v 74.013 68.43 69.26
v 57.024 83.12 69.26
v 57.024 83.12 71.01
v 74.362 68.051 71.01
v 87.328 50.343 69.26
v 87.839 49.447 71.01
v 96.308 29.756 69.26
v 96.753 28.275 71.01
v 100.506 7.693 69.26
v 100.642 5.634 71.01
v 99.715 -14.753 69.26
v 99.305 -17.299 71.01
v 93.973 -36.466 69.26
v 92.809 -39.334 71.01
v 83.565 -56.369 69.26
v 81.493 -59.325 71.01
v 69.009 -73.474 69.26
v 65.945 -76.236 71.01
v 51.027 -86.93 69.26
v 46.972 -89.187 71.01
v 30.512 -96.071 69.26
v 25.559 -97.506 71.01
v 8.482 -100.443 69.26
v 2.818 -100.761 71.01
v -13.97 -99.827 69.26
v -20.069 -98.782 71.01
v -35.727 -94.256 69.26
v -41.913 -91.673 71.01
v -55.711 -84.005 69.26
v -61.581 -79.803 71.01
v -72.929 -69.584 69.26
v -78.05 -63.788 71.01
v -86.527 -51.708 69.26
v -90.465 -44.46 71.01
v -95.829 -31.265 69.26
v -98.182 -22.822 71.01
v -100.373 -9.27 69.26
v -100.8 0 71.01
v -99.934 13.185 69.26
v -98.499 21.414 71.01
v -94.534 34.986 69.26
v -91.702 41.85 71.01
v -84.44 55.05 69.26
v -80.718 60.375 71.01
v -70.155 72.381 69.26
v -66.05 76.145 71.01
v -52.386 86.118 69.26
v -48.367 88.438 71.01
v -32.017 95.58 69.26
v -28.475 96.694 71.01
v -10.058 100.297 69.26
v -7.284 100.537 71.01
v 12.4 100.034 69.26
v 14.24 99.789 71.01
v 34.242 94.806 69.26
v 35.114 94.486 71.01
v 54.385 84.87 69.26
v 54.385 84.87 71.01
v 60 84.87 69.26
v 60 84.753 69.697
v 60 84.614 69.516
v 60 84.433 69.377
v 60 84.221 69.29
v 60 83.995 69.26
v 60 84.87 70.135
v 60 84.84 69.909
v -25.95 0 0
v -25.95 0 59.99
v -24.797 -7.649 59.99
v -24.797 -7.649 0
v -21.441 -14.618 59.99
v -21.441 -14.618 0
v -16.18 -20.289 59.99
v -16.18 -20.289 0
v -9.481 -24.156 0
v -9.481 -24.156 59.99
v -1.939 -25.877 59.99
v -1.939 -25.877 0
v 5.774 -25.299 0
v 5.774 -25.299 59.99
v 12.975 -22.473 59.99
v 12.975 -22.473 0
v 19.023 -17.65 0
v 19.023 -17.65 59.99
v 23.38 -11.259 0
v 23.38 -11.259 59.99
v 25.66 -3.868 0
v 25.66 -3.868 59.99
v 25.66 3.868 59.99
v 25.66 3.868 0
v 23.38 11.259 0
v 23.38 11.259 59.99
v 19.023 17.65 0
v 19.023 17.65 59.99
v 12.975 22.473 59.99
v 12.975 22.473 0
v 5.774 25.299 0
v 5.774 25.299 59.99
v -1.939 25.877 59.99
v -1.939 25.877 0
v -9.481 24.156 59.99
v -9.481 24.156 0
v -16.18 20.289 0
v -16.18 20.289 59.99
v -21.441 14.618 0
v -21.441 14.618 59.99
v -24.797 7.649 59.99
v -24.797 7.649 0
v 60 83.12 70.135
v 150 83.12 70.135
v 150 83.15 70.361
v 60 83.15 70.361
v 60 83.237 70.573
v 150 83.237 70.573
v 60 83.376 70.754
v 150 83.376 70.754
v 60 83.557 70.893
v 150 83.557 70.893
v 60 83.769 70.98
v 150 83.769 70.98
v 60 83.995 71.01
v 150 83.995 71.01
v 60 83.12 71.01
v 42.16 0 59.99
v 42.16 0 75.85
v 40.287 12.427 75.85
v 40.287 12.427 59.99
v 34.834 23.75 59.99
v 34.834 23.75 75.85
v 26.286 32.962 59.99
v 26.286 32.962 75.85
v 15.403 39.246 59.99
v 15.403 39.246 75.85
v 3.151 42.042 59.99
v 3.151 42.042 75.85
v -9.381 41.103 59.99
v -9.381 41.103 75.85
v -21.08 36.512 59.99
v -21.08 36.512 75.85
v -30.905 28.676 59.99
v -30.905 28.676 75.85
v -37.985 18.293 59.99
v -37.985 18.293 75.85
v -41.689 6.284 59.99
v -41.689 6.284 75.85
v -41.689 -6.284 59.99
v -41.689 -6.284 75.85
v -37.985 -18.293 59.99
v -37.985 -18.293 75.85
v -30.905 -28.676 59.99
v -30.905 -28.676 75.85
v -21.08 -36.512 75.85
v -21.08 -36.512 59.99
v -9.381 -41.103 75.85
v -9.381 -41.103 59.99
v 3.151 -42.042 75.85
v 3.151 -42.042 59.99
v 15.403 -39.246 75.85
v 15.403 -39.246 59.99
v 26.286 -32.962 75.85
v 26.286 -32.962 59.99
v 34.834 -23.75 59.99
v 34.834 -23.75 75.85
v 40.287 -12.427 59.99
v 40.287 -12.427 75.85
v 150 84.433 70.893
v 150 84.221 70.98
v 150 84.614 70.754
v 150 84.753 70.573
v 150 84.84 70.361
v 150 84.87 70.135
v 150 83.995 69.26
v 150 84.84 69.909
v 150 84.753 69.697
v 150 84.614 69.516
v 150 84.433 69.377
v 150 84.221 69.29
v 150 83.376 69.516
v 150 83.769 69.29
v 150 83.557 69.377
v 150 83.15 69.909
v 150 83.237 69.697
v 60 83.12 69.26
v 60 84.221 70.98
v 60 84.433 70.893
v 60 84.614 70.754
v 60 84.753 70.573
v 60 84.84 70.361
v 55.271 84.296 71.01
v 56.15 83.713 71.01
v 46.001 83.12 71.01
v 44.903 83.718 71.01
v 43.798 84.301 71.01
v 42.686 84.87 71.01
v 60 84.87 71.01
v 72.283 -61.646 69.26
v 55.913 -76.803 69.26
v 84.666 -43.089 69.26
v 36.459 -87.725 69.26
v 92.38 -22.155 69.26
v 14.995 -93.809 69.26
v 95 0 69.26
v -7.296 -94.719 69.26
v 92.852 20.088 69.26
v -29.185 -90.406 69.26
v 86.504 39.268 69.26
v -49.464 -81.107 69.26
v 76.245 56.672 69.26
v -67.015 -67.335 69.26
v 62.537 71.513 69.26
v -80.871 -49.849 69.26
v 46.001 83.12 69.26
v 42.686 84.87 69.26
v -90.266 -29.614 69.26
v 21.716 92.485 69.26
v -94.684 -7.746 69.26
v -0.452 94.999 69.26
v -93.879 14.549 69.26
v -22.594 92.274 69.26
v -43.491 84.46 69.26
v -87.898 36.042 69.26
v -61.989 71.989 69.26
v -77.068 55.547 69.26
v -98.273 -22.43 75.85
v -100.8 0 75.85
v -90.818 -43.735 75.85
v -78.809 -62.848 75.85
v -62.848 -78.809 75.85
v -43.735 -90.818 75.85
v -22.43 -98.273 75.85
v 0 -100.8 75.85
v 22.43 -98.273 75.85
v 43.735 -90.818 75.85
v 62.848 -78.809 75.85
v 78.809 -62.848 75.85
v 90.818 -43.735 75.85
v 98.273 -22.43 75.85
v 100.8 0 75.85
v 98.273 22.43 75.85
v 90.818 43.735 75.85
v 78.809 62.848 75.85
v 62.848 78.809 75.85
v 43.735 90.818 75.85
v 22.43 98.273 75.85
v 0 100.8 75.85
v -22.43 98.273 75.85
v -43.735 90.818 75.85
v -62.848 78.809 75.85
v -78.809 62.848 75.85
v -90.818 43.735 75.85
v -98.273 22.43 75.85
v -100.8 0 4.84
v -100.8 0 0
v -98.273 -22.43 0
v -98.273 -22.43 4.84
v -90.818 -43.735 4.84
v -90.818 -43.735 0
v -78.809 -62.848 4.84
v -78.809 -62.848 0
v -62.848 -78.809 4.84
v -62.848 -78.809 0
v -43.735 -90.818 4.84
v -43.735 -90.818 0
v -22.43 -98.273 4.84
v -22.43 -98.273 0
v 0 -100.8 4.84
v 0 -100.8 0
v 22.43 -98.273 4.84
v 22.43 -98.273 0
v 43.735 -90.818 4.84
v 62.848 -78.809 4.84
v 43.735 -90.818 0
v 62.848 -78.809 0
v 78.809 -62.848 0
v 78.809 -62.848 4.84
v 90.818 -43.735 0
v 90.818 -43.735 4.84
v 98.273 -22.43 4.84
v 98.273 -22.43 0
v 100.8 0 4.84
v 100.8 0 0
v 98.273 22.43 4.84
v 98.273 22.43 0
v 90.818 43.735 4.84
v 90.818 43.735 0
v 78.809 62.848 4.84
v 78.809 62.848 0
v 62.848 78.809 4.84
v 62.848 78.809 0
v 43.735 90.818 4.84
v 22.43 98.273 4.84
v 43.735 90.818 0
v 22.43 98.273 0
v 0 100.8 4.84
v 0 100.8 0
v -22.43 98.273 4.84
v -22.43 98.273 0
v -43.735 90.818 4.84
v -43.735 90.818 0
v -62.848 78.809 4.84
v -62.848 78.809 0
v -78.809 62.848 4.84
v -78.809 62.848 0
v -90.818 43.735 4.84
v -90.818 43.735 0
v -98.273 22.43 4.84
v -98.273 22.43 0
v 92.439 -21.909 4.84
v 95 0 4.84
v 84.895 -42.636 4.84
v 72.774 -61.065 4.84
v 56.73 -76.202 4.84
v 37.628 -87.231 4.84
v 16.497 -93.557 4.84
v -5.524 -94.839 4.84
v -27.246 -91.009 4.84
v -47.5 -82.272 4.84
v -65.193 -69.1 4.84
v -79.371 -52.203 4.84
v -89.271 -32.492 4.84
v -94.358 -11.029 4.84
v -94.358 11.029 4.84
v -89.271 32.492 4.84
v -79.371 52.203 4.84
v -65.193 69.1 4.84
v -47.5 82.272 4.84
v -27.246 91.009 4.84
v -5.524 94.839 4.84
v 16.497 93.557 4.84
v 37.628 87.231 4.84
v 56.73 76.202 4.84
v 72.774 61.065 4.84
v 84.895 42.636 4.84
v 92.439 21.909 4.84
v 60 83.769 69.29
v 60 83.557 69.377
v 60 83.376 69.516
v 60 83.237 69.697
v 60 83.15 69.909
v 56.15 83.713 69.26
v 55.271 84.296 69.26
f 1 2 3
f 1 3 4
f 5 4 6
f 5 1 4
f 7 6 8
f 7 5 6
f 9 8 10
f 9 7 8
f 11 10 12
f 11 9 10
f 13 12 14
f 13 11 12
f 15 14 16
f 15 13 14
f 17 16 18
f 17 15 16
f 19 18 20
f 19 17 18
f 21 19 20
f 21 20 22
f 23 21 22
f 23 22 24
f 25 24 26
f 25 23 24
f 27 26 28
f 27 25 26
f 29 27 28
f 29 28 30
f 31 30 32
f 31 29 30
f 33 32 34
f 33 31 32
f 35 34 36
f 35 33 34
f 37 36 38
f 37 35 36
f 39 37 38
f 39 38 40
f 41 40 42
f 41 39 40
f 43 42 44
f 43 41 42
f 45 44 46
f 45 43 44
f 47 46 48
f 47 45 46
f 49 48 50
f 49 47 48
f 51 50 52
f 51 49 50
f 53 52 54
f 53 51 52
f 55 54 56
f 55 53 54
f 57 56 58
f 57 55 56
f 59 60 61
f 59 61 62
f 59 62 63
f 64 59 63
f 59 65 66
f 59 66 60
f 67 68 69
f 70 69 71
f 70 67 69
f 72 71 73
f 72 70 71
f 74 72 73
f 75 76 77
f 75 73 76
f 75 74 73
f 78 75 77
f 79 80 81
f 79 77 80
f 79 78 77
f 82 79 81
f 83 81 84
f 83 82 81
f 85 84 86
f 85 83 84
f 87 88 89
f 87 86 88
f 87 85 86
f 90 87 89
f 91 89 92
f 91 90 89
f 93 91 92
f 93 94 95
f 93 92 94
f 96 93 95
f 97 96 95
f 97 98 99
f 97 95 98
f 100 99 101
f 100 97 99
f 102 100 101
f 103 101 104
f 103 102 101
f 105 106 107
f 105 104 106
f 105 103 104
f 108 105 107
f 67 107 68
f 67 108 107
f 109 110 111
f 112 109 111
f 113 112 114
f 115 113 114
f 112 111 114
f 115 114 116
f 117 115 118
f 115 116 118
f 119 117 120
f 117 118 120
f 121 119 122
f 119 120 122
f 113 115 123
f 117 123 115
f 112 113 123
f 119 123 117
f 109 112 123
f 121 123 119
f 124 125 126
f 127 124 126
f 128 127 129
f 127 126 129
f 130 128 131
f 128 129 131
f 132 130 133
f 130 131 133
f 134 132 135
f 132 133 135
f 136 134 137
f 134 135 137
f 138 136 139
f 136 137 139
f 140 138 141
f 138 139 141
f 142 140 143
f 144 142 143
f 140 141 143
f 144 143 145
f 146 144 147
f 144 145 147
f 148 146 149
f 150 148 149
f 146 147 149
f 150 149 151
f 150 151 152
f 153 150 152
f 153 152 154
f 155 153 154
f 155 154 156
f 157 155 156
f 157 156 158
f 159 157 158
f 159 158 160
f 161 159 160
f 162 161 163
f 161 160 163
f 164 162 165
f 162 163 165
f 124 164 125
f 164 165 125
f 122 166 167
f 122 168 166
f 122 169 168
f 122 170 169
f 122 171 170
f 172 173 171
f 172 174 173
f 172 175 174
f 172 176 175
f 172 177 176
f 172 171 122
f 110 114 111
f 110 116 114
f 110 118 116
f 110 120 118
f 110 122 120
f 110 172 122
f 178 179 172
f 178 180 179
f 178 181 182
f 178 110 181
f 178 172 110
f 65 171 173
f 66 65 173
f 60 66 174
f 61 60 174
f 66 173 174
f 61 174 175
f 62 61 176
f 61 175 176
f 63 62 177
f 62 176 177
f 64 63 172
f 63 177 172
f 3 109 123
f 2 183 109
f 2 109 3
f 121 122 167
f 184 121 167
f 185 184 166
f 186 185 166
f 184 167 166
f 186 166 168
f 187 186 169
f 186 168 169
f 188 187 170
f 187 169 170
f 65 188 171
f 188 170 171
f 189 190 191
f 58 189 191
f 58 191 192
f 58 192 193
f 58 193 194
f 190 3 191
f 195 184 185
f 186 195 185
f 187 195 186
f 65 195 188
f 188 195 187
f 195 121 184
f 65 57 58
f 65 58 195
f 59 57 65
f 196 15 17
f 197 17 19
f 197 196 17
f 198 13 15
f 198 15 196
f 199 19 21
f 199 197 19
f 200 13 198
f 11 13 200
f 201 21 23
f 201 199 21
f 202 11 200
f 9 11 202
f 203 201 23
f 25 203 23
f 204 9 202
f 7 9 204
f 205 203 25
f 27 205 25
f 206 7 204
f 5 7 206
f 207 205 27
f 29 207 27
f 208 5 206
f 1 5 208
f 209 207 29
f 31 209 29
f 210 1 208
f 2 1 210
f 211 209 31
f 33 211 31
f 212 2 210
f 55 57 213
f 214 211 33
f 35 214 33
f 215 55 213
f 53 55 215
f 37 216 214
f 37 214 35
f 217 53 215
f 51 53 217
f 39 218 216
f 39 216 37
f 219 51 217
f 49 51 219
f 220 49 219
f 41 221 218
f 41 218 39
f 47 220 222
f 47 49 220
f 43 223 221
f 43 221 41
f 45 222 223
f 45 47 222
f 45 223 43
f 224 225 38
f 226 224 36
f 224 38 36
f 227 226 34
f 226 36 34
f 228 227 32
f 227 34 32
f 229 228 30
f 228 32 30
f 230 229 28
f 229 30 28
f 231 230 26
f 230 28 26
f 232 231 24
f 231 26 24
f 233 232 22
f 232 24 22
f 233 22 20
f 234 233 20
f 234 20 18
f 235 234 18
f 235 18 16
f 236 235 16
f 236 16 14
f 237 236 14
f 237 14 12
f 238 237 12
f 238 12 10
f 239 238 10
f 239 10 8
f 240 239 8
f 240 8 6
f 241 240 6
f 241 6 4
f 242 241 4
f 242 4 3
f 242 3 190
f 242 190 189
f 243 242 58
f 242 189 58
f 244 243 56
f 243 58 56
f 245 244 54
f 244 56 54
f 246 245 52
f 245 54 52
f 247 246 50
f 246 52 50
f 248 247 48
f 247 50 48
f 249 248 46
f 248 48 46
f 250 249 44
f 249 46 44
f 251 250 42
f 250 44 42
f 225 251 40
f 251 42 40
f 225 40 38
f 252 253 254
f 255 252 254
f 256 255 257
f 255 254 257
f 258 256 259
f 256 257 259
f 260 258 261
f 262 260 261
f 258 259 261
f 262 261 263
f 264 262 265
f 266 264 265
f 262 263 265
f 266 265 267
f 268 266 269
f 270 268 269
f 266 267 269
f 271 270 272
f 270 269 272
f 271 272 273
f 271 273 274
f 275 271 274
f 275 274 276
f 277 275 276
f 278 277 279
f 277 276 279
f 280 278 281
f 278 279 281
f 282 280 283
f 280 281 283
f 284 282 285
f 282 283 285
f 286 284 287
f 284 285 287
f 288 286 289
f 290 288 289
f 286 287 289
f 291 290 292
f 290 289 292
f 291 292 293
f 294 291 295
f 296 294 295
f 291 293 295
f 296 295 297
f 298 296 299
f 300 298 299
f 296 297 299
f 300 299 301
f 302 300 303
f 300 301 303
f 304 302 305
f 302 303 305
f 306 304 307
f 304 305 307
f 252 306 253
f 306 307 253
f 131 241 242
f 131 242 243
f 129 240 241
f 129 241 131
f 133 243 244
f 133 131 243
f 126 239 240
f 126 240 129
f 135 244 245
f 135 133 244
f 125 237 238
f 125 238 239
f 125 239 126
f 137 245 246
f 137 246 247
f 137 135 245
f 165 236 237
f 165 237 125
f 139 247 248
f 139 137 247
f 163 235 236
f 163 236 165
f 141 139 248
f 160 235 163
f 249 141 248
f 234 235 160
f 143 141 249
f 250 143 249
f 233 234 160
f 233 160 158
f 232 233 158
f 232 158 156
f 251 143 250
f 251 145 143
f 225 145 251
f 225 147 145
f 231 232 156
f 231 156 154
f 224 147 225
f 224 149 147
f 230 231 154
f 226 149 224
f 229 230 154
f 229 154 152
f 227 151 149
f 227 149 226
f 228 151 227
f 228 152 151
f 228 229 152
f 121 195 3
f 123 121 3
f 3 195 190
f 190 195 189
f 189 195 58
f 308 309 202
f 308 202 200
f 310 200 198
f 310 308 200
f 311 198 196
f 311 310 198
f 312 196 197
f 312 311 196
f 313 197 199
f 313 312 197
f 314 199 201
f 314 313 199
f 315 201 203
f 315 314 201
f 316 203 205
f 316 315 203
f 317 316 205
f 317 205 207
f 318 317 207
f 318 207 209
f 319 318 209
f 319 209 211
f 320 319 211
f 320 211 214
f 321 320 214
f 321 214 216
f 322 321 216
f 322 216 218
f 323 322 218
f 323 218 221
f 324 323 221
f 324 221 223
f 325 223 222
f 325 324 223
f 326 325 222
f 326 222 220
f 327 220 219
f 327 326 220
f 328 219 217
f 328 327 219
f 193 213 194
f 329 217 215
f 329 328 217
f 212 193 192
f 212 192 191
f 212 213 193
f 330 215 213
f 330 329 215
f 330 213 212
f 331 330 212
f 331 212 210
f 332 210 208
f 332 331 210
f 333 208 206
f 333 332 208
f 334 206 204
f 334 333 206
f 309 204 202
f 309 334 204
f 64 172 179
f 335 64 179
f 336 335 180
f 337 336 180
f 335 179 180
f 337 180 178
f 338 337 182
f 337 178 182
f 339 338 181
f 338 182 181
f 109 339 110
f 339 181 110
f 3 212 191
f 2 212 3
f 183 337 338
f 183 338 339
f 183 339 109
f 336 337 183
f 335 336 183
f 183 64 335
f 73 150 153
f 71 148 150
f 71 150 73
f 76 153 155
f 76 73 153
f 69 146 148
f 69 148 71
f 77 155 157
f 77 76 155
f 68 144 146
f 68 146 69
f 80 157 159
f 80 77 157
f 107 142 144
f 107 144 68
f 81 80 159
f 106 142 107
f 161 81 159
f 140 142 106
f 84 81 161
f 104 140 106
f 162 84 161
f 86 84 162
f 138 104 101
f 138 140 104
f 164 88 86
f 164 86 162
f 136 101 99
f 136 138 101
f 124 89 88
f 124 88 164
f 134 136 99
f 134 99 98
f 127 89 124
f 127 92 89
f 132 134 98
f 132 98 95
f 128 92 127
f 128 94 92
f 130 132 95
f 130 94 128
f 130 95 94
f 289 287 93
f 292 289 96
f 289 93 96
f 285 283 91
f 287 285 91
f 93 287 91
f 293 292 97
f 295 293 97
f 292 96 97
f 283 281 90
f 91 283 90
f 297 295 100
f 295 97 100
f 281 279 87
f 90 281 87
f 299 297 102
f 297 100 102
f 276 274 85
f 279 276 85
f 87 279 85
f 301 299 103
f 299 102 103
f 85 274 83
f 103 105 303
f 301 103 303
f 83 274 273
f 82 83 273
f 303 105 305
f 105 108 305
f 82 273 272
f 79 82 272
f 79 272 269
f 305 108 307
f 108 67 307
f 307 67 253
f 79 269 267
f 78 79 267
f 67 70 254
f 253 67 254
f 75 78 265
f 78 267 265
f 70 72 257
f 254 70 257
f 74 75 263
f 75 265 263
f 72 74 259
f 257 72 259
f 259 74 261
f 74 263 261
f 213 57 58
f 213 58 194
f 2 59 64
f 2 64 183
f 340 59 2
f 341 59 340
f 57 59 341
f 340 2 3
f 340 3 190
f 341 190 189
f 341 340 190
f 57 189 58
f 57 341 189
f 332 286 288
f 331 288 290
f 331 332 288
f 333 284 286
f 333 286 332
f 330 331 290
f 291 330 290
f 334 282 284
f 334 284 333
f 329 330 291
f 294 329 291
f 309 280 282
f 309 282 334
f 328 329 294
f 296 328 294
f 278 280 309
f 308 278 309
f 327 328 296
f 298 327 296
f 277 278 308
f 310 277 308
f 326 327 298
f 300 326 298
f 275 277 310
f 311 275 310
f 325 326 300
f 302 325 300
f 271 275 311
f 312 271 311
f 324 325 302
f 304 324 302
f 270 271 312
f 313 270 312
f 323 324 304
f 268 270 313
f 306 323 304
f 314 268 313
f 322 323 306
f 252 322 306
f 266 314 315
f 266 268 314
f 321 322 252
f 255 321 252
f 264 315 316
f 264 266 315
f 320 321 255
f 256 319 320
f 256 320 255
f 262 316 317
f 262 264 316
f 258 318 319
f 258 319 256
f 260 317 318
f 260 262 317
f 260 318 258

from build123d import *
from build123d.topology import SkipClean

# Parameters (mm, degrees)
SKETCH1_R           = 100.8
SKETCH1_R_2         = 25.95
BOSS_EXTRUDE1_DEPTH = 4.84
SKETCH2_R           = 45.11
SKETCH2_R_2         = 25.95
BOSS_EXTRUDE2_DEPTH = 66.17
SKETCH3_R           = 100.8
SKETCH3_R_2         = 25.95
BOSS_EXTRUDE3_DEPTH = 4.84
SKETCH4_R           = 42.16
CUT_EXTRUDE1_DEPTH  = 15.86
BOSS_EXTRUDE4_START = 66.17
SKETCH5_R           = 95
SKETCH5_R_2         = 45.11
BOSS_EXTRUDE4_DEPTH = 66.17
BOSS_EXTRUDE6_START = 1.75
BOSS_EXTRUDE6_DEPTH = 1.75
SKETCH9_W           = 1.947145626
SKETCH9_H           = 1.958948438
CUT_EXTRUDE6_DEPTH  = 90


with BuildPart() as part:
    # Sketch1 → Boss-Extrude1 (new body)
    with BuildSketch(Plane.XY):
        with Locations(Location((0, 0, 0), (0, 0, 180))):
            Circle(SKETCH1_R)
        with Locations(Location((0, 0, 0), (0, 0, 180))):
            Circle(SKETCH1_R_2, mode=Mode.SUBTRACT)
    extrude(amount=BOSS_EXTRUDE1_DEPTH)

    # Sketch2 → Boss-Extrude2 (add)
    with BuildSketch(Plane.XY.offset(4.84)):
        Circle(SKETCH2_R)
        with Locations(Location((0, 0, 0), (0, 0, 180))):
            Circle(SKETCH2_R_2, mode=Mode.SUBTRACT)
    extrude(amount=BOSS_EXTRUDE2_DEPTH)

    # Sketch3 → Boss-Extrude3 (add)
    with BuildSketch(Plane.XY.offset(71.01)):
        with Locations(Location((0, 0, 0), (0, 0, 180))):
            Circle(SKETCH3_R)
        with Locations(Location((0, 0, 0), (0, 0, 180))):
            Circle(SKETCH3_R_2, mode=Mode.SUBTRACT)
    extrude(amount=BOSS_EXTRUDE3_DEPTH)

    # Sketch4 → Cut-Extrude1 (cut)
    with BuildSketch(Plane.XY.offset(75.85)):
        Circle(SKETCH4_R)
    extrude(amount=-CUT_EXTRUDE1_DEPTH, mode=Mode.SUBTRACT)

    # Sketch5 → Boss-Extrude4 (add)
    with BuildSketch(Plane(origin=(0, 0, 71.01), x_dir=(-1, 0, 0), z_dir=(0, 0, -1)).offset(BOSS_EXTRUDE4_START)):
        with Locations(Location((0, 0, 0), (0, 0, 180))):
            Circle(SKETCH5_R)
        Circle(SKETCH5_R_2, mode=Mode.SUBTRACT)
    extrude(amount=-BOSS_EXTRUDE4_DEPTH)

    # Sketch8 → Boss-Extrude6 (add)
    with SkipClean():  # the faces are left unmerged after this step: merging them gives an invalid solid
        with BuildSketch(Plane(origin=(0, 0, 71.01), x_dir=(-1, 0, 0), z_dir=(0, 0, -1)).offset(BOSS_EXTRUDE6_START)):
            with BuildLine():
                Line((-54.384952882, 84.87), (-42.685865342, 84.87))
                ThreePointArc((-42.685865342, 84.87), (44.35192128, -84.011350893), (-46.000713038, 83.12))
                Line((-46.000713038, 83.12), (-57.023728394, 83.12))
                ThreePointArc((-57.023728394, 83.12), (55.711212435, -84.005361788), (-54.384952882, 84.87))
            make_face()
            with BuildLine():
                ThreePointArc((-57.023728394, 83.12), (-55.711212435, 84.005361788), (-54.384952882, 84.87))
                Line((-54.384952882, 84.87), (-150, 84.87))
                Line((-150, 84.87), (-150, 83.12))
                Line((-150, 83.12), (-57.023728394, 83.12))
            make_face()
        extrude(amount=-BOSS_EXTRUDE6_DEPTH)


with BuildPart() as boss_extrude6_piece_1:
    # of the separate pieces the step leaves, piece 1, a body of its own (boss_extrude6_pieces)
    add(part.part.solids().sort_by_distance((-100.8, 0, 0))[0])


with BuildPart() as boss_extrude6_piece_2:
    # of the separate pieces the step leaves, piece 2, a body of its own (boss_extrude6_pieces)
    add(part.part.solids().sort_by_distance((150, 83.12, 69.26))[0])

    # Sketch9 → Cut-Extrude6 (cut)
    # profile 1 of 5: a face of its own
    with BuildSketch(Plane(origin=(150, 0, 0), x_dir=(0, 0, -1), z_dir=(1, 0, 0))):
        with Locations((-70.135, 83.995)):
            Rectangle(SKETCH9_W, SKETCH9_H)
        Polygon((-69.26, 83.995), (-69.26, 83.12), (-70.135, 83.12), (-71.01, 83.12), (-71.01, 83.995), (-71.01, 84.87), (-70.135, 84.87), (-69.26, 84.87), align=None, mode=Mode.SUBTRACT)
    # profile 2 of 5: a face of its own
    with BuildSketch(Plane(origin=(150, 0, 0), x_dir=(0, 0, -1), z_dir=(1, 0, 0))):
        with BuildLine():
            Line((-71.01, 83.12), (-70.135, 83.12))
            ThreePointArc((-70.135, 83.12), (-70.753718434, 83.376281566), (-71.01, 83.995))
            Line((-71.01, 83.995), (-71.01, 83.12))
        make_face()
    # profile 3 of 5: a face of its own
    with BuildSketch(Plane(origin=(150, 0, 0), x_dir=(0, 0, -1), z_dir=(1, 0, 0))):
        with BuildLine():
            Line((-70.135, 83.12), (-69.26, 83.12))
            Line((-69.26, 83.12), (-69.26, 83.995))
            ThreePointArc((-69.26, 83.995), (-69.516281566, 83.376281566), (-70.135, 83.12))
        make_face()
    # profile 4 of 5: a face of its own
    with BuildSketch(Plane(origin=(150, 0, 0), x_dir=(0, 0, -1), z_dir=(1, 0, 0))):
        with BuildLine():
            ThreePointArc((-70.135, 84.87), (-69.516281566, 84.613718434), (-69.26, 83.995))
            Line((-69.26, 83.995), (-69.26, 84.87))
            Line((-69.26, 84.87), (-70.135, 84.87))
        make_face()
    # profile 5 of 5: a face of its own
    with BuildSketch(Plane(origin=(150, 0, 0), x_dir=(0, 0, -1), z_dir=(1, 0, 0))):
        with BuildLine():
            ThreePointArc((-71.01, 83.995), (-70.753718434, 84.613718434), (-70.135, 84.87))
            Line((-70.135, 84.87), (-71.01, 84.87))
            Line((-71.01, 84.87), (-71.01, 83.995))
        make_face()
    extrude(amount=-CUT_EXTRUDE6_DEPTH, mode=Mode.SUBTRACT)


solid = Compound([boss_extrude6_piece_1.part, boss_extrude6_piece_2.part])
